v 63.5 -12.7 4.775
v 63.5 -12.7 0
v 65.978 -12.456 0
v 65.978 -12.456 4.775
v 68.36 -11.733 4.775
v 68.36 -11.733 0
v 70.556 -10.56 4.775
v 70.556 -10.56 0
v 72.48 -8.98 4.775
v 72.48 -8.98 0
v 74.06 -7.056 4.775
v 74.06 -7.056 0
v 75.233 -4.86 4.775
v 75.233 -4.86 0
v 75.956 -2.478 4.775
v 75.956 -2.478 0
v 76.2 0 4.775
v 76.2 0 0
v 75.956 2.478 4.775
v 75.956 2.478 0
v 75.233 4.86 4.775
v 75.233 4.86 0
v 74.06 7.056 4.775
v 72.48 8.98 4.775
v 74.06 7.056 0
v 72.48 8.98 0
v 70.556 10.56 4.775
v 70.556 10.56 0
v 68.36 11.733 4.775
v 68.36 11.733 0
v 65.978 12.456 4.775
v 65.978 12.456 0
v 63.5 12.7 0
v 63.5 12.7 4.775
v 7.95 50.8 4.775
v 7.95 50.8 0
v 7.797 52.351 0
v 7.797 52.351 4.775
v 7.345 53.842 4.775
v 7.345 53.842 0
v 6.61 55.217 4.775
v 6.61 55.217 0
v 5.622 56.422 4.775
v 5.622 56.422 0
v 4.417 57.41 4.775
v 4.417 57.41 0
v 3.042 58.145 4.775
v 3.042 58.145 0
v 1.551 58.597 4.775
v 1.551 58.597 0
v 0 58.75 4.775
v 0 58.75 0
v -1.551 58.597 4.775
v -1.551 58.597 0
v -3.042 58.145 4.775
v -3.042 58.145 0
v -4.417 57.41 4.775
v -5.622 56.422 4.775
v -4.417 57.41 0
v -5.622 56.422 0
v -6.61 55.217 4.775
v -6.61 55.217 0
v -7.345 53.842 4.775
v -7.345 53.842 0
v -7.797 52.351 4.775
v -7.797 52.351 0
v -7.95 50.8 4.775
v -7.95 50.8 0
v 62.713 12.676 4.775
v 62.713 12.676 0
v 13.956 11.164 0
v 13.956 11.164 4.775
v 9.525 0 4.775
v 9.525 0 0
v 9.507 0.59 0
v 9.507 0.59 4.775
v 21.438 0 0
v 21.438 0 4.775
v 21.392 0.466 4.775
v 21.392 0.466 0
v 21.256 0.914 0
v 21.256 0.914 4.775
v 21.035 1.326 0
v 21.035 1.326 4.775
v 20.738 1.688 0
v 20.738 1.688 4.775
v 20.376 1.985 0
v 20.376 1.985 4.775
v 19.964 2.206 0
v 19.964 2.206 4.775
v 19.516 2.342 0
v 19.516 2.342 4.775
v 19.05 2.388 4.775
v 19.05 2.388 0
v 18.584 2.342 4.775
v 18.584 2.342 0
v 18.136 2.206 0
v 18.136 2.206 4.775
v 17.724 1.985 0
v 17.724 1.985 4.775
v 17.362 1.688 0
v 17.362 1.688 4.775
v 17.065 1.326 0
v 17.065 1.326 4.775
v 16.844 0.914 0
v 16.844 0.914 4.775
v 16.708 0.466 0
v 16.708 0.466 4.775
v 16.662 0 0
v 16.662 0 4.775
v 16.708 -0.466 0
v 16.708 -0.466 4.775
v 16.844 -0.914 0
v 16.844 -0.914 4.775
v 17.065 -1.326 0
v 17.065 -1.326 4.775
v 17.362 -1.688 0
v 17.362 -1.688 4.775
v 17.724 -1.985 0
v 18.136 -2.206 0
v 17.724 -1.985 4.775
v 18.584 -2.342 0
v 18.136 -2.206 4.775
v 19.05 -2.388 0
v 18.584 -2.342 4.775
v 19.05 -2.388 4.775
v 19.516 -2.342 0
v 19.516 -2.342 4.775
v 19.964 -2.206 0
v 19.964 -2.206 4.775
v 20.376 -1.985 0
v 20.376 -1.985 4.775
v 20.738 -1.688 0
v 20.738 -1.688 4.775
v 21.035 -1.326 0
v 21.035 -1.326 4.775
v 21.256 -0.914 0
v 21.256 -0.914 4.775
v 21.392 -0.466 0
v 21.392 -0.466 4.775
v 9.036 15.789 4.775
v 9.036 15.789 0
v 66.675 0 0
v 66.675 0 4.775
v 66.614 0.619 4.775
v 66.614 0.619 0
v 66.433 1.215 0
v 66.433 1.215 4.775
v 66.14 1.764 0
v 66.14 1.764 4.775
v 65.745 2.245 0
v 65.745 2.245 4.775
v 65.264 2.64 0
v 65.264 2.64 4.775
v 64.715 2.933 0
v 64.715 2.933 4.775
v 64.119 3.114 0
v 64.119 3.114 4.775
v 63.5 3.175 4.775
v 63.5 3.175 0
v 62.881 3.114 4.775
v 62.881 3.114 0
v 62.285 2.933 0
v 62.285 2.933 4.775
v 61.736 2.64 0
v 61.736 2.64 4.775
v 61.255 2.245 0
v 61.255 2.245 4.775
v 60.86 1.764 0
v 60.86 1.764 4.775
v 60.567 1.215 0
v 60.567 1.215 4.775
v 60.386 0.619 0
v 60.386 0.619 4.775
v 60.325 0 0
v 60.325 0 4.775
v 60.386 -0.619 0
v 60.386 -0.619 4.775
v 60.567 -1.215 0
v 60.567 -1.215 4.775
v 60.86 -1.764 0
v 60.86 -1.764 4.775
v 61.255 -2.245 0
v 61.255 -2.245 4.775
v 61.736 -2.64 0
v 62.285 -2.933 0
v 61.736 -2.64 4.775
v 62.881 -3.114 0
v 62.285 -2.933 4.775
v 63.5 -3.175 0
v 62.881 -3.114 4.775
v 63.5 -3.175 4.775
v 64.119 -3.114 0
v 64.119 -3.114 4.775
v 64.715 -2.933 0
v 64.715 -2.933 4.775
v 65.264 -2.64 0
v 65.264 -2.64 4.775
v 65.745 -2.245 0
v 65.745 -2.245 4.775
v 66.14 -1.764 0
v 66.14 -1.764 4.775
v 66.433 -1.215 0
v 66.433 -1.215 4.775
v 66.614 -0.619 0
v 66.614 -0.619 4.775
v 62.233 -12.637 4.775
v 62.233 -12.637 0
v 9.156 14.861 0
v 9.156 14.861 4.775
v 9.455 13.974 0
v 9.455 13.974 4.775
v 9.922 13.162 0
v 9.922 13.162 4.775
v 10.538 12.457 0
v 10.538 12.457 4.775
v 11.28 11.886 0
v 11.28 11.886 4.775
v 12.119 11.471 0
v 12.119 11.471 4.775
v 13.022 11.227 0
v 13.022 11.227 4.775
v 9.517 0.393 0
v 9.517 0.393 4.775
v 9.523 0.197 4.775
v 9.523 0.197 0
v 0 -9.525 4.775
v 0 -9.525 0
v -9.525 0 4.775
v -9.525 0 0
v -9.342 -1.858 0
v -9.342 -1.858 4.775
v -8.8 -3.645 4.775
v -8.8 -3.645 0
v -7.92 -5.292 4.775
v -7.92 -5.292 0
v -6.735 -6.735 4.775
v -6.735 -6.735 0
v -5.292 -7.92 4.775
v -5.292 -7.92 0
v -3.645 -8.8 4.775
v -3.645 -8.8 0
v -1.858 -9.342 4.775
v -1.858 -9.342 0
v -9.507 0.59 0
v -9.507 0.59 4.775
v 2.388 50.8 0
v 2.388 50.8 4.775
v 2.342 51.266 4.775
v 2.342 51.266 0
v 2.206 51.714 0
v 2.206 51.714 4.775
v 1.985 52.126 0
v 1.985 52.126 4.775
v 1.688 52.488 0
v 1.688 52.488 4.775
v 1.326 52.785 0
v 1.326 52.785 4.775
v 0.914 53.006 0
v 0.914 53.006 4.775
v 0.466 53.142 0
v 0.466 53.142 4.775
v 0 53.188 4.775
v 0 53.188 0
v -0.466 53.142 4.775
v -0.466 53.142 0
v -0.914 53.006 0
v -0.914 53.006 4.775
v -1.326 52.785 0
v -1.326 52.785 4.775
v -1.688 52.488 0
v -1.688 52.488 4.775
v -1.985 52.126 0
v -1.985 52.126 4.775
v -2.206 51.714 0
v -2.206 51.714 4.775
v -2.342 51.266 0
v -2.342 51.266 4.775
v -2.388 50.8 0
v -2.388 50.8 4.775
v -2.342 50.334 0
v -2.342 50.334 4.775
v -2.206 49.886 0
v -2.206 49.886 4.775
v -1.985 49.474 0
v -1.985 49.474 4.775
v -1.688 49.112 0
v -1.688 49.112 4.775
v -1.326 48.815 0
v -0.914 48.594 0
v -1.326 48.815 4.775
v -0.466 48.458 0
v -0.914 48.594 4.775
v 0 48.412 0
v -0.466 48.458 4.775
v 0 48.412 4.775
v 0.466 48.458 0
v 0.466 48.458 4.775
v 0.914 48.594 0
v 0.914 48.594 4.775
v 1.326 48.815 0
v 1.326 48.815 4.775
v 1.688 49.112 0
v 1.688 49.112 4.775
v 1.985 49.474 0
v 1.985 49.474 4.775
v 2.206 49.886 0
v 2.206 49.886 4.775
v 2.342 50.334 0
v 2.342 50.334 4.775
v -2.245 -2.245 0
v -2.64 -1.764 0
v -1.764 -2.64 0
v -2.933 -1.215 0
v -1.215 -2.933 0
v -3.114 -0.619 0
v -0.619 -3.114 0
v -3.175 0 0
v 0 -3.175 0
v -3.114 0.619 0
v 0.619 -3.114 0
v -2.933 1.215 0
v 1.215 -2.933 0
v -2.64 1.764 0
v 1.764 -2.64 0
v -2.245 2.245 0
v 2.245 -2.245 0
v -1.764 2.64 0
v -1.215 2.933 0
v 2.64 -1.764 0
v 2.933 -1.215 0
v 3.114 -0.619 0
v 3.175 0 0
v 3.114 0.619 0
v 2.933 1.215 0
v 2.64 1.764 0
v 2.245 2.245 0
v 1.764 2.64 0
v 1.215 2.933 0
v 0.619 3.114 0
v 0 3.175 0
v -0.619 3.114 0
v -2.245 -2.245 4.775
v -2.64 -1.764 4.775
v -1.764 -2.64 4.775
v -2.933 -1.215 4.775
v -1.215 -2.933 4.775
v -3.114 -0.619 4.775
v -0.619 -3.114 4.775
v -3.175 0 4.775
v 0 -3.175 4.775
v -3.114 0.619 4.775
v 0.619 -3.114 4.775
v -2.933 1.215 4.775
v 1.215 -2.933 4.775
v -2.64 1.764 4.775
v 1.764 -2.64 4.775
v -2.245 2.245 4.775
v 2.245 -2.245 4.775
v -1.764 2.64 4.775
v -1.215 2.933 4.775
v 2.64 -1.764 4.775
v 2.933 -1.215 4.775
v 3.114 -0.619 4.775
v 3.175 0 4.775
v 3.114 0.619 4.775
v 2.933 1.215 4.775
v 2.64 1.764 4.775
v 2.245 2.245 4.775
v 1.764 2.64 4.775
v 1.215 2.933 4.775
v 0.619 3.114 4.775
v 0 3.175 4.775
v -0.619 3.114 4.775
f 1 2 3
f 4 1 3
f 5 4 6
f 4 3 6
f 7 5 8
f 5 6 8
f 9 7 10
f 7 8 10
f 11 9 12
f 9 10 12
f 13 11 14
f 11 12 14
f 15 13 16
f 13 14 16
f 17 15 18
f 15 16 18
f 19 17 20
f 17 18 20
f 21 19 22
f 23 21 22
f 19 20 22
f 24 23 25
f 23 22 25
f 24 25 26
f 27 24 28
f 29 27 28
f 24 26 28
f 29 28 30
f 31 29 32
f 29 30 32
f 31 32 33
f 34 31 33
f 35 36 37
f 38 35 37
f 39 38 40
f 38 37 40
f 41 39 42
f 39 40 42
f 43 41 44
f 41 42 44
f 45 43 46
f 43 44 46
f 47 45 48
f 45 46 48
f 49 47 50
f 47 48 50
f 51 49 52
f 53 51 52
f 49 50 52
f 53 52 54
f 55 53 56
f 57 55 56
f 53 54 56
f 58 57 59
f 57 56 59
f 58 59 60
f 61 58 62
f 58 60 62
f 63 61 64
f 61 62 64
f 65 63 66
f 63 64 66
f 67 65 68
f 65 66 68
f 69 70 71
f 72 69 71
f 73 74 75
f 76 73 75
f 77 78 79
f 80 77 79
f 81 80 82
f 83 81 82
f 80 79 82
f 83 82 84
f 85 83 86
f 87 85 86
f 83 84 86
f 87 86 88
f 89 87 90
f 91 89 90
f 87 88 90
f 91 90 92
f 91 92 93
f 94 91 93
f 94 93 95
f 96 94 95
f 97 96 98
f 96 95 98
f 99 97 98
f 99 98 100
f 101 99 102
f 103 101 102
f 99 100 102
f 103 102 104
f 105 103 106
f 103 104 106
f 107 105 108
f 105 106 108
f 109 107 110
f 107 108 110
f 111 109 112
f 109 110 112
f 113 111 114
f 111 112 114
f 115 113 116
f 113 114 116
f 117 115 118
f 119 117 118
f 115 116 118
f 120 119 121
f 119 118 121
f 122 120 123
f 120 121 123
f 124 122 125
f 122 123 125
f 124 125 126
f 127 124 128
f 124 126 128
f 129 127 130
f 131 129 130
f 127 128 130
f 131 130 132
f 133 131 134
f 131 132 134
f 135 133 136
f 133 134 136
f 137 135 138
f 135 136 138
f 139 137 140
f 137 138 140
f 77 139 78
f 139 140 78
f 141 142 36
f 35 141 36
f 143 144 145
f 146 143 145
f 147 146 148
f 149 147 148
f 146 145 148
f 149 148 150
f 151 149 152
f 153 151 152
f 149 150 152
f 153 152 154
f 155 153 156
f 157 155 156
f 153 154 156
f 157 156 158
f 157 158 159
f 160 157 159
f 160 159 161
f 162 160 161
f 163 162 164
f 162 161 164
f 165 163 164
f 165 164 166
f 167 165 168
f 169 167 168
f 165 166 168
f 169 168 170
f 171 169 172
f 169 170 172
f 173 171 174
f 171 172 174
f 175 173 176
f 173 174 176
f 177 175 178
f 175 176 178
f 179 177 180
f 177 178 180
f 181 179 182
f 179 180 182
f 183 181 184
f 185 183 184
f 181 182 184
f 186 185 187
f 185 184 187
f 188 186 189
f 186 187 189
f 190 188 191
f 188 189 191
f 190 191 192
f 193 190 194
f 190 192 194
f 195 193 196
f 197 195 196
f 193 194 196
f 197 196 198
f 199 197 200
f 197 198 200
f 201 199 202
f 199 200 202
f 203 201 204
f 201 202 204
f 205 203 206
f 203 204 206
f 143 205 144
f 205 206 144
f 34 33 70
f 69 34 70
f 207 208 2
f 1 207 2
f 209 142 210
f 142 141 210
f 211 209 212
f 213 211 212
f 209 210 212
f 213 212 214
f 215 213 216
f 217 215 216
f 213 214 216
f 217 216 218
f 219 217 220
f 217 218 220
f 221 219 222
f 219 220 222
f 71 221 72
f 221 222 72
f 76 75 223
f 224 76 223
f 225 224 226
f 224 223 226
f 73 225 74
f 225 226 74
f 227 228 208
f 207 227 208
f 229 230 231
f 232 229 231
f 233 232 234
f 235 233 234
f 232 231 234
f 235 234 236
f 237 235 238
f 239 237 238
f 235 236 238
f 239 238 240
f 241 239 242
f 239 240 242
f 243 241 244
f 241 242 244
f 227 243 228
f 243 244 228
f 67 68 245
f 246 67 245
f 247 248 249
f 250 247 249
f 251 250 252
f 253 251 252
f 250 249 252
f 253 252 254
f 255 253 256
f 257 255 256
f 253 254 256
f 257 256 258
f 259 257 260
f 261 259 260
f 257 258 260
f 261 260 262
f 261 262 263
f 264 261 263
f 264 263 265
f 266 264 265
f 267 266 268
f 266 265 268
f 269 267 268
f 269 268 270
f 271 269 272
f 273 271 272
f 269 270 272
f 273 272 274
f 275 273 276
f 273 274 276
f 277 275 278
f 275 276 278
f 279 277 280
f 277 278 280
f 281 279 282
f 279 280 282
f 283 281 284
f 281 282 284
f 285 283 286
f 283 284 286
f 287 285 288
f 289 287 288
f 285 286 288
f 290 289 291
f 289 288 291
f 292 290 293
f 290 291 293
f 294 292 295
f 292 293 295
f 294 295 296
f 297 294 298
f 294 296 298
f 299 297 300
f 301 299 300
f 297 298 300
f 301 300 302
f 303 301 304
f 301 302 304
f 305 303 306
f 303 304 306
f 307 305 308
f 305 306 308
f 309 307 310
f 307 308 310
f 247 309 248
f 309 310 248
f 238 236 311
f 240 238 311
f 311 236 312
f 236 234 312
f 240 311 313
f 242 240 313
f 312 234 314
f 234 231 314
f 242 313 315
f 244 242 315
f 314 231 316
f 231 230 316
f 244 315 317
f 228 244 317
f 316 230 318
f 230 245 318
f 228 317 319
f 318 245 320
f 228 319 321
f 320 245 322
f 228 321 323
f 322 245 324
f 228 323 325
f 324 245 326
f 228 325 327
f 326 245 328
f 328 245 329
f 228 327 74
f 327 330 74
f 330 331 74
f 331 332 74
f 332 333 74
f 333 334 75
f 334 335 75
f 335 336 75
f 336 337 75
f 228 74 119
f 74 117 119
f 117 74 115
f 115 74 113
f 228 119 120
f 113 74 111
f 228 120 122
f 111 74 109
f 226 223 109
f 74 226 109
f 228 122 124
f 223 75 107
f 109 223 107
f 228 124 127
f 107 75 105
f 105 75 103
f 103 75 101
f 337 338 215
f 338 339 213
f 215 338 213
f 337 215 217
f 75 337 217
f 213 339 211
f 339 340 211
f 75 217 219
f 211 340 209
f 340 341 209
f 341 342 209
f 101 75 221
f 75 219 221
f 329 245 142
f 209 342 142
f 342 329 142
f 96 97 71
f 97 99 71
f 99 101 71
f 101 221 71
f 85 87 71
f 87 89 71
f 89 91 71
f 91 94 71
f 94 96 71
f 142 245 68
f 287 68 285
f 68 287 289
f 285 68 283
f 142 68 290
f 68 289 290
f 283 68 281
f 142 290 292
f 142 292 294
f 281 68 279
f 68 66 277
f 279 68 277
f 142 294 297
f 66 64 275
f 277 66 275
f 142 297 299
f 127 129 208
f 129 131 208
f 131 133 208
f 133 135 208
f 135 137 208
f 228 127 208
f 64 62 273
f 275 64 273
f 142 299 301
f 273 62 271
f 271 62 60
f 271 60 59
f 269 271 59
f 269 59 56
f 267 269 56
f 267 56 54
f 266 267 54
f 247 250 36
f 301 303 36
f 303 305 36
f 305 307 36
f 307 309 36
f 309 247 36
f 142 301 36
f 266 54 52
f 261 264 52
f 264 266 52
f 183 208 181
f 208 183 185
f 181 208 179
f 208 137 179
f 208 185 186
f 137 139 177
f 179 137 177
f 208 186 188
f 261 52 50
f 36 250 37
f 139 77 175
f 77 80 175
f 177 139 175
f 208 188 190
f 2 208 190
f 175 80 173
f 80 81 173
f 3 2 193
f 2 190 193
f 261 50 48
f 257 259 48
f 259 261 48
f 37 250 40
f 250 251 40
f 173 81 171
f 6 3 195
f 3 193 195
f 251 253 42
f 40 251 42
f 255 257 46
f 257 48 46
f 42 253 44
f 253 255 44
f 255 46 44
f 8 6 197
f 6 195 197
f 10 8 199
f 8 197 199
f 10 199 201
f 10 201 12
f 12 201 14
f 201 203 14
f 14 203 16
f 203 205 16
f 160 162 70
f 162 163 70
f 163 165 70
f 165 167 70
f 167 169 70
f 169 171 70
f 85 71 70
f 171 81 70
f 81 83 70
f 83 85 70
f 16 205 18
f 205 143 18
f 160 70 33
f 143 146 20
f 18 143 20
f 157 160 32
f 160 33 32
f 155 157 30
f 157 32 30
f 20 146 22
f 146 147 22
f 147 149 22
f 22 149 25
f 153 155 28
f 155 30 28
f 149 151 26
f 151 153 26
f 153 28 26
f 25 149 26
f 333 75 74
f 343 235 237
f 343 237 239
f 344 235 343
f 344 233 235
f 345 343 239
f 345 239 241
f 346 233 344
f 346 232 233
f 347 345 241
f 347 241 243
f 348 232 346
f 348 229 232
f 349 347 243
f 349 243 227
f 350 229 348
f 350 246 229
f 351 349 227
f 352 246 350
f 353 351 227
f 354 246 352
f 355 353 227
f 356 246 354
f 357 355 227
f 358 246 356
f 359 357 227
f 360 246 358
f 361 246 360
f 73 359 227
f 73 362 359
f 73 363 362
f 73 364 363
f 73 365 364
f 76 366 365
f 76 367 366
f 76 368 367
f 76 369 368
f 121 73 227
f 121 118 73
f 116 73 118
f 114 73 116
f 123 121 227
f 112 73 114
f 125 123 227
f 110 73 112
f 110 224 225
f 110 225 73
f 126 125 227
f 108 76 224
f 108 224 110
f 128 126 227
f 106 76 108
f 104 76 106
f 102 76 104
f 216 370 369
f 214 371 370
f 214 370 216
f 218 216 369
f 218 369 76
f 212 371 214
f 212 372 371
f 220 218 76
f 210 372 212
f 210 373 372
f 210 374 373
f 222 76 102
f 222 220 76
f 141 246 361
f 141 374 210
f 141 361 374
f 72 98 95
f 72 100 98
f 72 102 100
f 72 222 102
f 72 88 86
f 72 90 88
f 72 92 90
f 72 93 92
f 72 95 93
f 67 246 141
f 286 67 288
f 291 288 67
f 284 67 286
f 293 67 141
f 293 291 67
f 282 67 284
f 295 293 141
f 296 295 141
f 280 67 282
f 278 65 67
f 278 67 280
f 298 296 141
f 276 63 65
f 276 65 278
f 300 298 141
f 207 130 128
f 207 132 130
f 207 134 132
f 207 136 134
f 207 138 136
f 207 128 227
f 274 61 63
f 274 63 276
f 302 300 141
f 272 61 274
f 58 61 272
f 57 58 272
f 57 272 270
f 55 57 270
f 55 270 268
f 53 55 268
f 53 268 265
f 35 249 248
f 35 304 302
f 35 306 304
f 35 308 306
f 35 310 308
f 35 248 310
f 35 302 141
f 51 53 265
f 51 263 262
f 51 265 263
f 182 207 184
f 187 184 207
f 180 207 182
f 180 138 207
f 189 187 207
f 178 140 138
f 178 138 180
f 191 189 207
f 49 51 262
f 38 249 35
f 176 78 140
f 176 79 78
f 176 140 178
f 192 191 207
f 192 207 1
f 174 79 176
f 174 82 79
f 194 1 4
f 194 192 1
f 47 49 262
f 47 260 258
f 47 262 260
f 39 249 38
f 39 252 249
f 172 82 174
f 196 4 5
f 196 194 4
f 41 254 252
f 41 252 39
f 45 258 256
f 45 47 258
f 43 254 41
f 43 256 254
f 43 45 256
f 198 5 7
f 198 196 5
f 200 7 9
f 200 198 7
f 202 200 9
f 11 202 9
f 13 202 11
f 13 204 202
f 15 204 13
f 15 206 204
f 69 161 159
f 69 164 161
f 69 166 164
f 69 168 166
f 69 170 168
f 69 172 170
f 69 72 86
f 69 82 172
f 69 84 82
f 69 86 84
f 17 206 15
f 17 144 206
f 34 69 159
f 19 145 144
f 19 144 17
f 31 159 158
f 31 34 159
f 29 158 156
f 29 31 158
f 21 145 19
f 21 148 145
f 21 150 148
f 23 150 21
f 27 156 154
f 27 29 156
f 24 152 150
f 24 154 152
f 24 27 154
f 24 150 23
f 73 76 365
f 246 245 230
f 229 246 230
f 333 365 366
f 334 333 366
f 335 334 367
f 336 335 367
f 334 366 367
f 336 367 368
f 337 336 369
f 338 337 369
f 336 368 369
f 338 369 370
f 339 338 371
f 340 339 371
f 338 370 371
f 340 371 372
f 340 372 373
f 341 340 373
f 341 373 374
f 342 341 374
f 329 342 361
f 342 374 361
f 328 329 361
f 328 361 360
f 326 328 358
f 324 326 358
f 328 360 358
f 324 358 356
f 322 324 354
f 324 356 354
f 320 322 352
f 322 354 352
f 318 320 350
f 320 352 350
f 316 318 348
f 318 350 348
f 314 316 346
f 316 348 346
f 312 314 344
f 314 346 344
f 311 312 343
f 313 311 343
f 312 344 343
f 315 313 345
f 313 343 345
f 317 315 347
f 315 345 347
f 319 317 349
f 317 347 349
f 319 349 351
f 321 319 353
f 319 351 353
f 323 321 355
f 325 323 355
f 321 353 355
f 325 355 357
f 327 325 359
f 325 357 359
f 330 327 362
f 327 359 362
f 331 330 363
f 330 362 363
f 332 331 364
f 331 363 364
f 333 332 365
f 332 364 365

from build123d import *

# Parameters (mm, degrees)
BOSS_EXTRUDE1_DEPTH = 4.7752
FILLET1_R           = 4.7752
SKETCH2_R           = 3.175
SKETCH2_R_2         = 2.3876
CUT_EXTRUDE1_DEPTH  = 4.7752


with BuildPart() as part:
    # Sketch1 → Boss-Extrude1 (new body)
    with BuildSketch(Plane.XY):
        with BuildLine():
            ThreePointArc((7.9502, 50.8), (0, 58.7502), (-7.9502, 50.8))
            Line((-7.9502, 50.8), (-9.506710526, 0.589983026))
            Line((-9.506710526, 0.589983026), (-9.525, 0))
            ThreePointArc((-9.525, 0), (-6.735192091, -6.735192091), (0, -9.525))
            Line((0, -9.525), (62.233167082, -12.636658354))
            Line((62.233167082, -12.636658354), (63.5, -12.7))
            ThreePointArc((63.5, -12.7), (76.2, 0), (63.5, 12.7))
            Line((63.5, 12.7), (62.713355965, 12.675614035))
            Line((62.713355965, 12.675614035), (9.183498158, 11.016188443))
            Line((9.183498158, 11.016188443), (7.9502, 50.8))
        make_face()
        with BuildLine():
            ThreePointArc((9.506710526, 0.589983026), (9.520426534, 0.295133223), (9.525, 0))
            Line((9.525, 0), (9.506710526, 0.589983026))
        make_face(mode=Mode.SUBTRACT)
    extrude(amount=BOSS_EXTRUDE1_DEPTH)

    # Fillet1
    fillet1_edges = [part.edges().sort_by_distance(p)[0] for p in [
        (9.183498158, 11.016188443, 2.3876),
    ]]
    fillet(fillet1_edges, radius=FILLET1_R)

    # Sketch2 → Cut-Extrude1 (cut)
    with BuildSketch(Plane.XY.offset(4.7752)):
        Circle(SKETCH2_R)
        with Locations((0, 50.8)):
            Circle(SKETCH2_R_2)
        with Locations((19.05, 0)):
            Circle(SKETCH2_R_2)
        with Locations((63.5, 0)):
            Circle(SKETCH2_R)
    extrude(amount=-CUT_EXTRUDE1_DEPTH, mode=Mode.SUBTRACT)


solid = part.part
